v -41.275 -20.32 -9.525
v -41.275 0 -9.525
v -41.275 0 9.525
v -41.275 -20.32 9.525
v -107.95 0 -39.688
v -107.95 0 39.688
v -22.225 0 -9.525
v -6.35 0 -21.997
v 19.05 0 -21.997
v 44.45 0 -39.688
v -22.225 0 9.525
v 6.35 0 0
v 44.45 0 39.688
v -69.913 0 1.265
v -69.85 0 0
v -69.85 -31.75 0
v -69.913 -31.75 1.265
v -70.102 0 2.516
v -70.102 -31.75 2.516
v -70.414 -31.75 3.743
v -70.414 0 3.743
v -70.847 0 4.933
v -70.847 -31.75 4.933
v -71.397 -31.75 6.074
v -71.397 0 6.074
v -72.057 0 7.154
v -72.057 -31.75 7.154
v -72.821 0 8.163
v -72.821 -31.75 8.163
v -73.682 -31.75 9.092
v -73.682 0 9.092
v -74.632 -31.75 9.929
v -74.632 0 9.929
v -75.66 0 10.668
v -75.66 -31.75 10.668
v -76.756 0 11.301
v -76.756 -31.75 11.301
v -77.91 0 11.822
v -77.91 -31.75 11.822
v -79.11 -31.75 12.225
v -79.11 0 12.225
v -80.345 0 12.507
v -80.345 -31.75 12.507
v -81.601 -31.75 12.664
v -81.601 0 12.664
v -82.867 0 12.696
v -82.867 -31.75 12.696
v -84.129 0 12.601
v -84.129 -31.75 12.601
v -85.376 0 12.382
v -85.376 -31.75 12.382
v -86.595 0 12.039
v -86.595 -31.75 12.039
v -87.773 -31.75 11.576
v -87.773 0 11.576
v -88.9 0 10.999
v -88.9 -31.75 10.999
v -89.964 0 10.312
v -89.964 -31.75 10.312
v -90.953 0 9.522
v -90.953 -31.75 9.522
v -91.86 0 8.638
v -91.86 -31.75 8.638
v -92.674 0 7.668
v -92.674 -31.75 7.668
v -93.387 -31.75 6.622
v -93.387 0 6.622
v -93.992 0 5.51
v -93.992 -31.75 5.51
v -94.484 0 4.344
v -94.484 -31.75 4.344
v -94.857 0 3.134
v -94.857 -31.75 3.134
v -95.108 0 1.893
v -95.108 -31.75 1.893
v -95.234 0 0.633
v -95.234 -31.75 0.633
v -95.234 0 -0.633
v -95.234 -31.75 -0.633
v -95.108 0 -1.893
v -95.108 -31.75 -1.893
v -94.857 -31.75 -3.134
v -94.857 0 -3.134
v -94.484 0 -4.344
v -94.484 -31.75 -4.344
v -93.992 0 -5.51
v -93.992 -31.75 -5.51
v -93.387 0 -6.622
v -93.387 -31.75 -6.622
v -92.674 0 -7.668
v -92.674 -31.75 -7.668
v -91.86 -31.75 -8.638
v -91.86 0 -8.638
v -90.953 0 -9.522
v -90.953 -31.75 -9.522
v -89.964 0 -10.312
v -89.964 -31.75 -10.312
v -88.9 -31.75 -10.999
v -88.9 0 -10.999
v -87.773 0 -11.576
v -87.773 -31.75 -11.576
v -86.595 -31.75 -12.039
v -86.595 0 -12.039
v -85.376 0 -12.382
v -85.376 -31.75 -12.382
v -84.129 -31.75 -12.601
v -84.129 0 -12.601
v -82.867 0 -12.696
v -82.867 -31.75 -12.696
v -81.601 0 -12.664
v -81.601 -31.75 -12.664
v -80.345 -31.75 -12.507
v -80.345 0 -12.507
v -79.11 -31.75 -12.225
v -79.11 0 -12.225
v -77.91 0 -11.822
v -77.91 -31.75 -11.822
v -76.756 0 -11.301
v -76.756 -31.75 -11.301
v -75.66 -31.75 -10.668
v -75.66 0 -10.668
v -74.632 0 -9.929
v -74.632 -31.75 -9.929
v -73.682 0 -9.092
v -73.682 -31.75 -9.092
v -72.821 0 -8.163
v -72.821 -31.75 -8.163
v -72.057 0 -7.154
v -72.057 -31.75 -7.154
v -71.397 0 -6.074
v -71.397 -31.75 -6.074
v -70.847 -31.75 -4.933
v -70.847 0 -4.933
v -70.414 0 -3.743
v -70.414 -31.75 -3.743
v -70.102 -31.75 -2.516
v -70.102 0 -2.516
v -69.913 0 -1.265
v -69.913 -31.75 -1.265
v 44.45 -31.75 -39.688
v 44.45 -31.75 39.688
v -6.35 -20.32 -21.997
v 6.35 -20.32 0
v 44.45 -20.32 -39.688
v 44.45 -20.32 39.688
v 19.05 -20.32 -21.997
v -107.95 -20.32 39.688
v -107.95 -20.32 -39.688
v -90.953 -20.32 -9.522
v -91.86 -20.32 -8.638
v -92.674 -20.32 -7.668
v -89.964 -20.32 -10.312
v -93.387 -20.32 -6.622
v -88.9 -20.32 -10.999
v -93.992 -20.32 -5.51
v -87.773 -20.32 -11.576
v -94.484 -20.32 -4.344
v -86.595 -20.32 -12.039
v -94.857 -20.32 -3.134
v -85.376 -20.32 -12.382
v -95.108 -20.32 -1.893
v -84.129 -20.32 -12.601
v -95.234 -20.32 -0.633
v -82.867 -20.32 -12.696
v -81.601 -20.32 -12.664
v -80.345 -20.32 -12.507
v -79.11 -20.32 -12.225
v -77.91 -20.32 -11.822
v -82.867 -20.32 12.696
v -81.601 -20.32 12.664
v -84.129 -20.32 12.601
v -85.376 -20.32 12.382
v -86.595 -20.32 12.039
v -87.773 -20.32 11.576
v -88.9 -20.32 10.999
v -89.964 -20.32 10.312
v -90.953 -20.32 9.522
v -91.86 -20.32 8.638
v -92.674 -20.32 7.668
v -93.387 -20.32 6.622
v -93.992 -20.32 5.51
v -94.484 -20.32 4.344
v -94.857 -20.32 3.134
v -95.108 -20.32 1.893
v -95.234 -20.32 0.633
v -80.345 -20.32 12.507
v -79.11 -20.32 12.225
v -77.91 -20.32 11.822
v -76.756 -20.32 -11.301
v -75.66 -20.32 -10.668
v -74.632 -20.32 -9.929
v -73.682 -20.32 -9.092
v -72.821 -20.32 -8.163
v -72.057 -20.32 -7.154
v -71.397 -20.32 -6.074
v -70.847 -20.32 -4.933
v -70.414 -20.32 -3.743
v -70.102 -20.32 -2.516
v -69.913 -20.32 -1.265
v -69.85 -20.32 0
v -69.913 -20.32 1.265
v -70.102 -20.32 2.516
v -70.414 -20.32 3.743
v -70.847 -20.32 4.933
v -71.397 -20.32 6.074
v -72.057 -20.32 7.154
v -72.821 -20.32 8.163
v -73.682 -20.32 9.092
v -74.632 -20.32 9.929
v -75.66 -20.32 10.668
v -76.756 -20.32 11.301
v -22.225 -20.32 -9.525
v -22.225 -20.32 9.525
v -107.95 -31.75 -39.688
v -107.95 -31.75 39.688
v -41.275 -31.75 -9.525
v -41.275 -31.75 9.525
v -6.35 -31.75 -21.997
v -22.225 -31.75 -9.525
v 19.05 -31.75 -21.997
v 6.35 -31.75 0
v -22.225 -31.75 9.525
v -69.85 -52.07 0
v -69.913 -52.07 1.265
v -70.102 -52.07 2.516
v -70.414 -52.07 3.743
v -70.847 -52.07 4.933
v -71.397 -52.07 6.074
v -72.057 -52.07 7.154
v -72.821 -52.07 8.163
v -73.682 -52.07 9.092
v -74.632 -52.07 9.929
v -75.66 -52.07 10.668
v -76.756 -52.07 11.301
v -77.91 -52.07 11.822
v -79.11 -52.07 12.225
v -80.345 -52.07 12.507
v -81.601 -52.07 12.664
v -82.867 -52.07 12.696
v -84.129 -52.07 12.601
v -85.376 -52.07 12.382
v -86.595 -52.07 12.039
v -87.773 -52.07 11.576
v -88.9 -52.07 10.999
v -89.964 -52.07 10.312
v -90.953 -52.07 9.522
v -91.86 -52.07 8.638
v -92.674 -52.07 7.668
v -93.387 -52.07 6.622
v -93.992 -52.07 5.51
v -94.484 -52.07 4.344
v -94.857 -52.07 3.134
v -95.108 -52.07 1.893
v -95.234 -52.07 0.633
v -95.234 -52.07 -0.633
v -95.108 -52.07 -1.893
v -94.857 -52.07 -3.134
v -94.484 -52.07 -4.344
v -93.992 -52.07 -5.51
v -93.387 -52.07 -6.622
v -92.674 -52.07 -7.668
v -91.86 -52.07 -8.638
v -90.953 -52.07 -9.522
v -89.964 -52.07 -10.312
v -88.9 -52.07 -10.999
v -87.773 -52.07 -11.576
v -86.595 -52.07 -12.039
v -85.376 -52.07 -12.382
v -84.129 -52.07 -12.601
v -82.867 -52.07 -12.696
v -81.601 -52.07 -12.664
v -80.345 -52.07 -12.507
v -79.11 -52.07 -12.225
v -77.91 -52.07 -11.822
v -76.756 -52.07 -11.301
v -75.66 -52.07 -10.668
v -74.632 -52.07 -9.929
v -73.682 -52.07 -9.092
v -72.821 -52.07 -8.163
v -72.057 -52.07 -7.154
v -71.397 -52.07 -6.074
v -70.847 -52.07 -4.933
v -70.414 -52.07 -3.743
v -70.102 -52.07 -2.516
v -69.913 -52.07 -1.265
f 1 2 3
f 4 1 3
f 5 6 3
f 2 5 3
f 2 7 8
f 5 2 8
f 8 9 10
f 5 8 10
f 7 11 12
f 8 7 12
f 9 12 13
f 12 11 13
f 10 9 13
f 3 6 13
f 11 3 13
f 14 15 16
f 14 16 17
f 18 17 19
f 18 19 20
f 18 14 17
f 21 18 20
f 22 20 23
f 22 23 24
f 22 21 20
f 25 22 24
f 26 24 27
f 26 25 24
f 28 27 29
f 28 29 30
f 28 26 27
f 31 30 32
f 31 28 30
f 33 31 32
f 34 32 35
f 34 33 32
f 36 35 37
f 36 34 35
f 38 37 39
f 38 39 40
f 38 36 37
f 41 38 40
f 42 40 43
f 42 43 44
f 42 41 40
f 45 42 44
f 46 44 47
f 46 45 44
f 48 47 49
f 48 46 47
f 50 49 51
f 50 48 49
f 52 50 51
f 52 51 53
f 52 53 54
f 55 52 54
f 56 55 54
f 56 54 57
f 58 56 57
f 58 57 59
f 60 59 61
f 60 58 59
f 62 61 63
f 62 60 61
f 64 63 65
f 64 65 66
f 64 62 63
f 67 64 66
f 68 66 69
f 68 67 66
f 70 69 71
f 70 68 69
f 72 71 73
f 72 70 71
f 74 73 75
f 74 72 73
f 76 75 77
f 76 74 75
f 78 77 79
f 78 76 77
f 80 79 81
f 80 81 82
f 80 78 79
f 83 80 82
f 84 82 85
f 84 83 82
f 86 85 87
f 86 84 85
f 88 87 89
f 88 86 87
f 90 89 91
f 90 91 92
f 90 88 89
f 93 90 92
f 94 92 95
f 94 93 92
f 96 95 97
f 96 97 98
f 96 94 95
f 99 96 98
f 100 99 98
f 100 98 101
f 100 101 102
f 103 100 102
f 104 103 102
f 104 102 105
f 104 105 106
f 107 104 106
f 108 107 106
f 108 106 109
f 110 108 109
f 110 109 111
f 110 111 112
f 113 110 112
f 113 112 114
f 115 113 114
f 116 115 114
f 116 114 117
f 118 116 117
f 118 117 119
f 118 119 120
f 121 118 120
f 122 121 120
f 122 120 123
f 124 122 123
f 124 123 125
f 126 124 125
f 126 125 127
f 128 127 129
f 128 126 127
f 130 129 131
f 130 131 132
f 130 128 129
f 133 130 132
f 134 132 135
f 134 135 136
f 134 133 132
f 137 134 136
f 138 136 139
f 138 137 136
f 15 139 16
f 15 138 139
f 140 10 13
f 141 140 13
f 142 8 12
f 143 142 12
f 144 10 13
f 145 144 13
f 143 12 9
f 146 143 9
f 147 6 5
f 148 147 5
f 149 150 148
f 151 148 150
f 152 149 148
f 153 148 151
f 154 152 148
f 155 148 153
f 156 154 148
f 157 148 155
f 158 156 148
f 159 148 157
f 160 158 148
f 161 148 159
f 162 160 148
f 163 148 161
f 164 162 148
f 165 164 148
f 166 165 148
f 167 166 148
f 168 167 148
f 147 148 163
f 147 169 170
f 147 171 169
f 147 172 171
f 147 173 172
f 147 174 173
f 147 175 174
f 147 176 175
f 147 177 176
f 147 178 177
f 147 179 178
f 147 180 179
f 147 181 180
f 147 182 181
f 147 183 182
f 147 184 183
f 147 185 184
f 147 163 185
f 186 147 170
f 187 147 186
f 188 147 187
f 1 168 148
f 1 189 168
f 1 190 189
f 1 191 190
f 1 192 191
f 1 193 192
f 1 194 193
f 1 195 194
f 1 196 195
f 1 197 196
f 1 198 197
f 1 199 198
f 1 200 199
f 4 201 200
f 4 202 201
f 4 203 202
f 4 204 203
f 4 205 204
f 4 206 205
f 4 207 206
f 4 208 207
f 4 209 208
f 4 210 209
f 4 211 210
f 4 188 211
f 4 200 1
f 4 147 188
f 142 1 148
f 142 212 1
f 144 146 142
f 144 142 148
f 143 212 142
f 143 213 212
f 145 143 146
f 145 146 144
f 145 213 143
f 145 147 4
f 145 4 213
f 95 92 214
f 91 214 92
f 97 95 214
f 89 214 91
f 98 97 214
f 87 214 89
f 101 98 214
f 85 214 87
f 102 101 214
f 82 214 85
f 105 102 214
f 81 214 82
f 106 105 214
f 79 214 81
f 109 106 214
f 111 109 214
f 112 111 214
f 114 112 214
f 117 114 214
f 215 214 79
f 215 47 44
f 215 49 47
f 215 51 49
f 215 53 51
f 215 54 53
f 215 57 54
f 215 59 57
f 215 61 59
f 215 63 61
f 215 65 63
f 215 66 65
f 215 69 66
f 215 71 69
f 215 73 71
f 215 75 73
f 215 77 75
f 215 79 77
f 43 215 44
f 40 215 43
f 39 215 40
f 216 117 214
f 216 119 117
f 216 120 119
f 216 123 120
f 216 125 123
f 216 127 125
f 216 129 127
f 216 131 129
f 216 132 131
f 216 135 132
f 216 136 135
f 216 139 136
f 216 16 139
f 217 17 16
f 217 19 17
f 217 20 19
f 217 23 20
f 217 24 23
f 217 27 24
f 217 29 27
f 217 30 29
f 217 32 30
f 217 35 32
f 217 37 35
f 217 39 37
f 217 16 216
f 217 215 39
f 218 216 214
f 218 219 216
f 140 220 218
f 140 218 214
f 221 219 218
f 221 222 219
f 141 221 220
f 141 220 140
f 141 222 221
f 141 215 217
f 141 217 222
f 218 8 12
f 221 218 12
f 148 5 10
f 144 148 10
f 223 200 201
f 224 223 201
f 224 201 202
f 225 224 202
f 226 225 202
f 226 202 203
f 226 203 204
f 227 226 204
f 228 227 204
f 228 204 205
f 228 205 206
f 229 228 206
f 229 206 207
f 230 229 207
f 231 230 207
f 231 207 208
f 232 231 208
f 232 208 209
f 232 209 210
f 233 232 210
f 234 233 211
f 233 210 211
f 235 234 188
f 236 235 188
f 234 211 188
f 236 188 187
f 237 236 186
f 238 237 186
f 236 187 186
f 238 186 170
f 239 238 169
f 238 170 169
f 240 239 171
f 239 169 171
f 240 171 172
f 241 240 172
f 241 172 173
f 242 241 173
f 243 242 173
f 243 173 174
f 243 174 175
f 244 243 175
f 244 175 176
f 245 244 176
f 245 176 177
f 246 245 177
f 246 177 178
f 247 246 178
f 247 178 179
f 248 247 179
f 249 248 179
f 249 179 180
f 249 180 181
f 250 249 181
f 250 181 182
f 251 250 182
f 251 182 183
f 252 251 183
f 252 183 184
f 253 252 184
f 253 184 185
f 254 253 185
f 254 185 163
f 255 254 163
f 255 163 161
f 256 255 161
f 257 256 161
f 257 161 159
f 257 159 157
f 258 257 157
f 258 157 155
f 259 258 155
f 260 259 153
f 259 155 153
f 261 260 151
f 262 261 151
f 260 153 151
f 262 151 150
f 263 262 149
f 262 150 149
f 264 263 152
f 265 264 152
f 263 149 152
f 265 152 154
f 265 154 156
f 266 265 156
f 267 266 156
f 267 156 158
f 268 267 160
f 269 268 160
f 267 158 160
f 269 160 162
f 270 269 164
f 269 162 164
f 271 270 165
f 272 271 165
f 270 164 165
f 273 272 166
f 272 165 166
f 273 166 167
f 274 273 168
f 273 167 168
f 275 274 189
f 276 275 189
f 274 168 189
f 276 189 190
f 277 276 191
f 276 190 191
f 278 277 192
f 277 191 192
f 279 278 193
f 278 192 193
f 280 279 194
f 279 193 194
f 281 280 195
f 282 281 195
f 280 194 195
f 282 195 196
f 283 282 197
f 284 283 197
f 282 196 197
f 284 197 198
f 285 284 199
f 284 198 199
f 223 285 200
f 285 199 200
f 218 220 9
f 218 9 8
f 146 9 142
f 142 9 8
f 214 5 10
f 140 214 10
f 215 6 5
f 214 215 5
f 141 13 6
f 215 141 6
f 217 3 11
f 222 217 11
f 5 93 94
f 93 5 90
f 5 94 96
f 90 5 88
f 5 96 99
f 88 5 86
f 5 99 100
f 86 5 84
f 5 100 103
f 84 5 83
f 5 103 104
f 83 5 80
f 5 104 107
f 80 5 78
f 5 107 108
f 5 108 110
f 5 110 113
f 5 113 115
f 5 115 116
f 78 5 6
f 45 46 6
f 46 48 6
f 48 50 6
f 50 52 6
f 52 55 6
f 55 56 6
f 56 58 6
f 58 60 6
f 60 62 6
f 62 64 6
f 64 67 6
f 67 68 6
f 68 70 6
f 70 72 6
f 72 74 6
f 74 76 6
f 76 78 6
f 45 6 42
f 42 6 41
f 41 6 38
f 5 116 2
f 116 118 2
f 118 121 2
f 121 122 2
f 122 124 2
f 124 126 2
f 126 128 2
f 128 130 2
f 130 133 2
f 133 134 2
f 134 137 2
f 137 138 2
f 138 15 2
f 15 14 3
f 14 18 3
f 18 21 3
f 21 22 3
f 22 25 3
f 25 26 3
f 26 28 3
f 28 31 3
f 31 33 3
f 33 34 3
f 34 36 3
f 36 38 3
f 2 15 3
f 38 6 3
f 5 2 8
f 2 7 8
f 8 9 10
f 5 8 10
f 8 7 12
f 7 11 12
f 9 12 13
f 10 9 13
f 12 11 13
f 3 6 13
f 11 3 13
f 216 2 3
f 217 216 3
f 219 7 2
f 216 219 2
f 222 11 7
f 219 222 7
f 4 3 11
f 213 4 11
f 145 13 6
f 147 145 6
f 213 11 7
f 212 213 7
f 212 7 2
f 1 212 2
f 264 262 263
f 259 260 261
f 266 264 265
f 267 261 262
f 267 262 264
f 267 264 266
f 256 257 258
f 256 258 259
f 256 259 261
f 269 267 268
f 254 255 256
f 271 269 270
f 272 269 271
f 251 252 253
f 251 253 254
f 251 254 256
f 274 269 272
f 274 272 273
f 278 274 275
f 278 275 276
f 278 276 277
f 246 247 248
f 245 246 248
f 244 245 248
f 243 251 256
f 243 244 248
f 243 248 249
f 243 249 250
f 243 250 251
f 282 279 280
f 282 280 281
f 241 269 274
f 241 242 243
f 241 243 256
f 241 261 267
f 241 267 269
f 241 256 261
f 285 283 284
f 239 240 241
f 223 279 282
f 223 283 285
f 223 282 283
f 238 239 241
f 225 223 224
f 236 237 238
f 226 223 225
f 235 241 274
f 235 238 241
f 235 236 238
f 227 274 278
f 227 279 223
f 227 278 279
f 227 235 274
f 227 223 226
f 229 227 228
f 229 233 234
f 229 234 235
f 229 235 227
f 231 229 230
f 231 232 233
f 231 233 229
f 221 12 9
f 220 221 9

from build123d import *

# Parameters (mm, degrees)
F0_R     = 12.7
F1_DEPTH = 52.07
F2_DEPTH = 20.32
F3_DEPTH = 31.75


with BuildPart() as f1:
    # F0 (on Front) → F1 (new body)
    with BuildSketch(Plane.XZ):
        with Locations((-82.55, 0)):
            Circle(F0_R)
    extrude(amount=F1_DEPTH)

    # F0 (on Front) → F2 (join)
    with BuildSketch(Plane.XZ):
        Polygon((44.45, -39.6875), (44.45, 0), (44.45, 39.6875), (-107.95, 39.6875), (-107.95, -39.6875), align=None)
        Polygon((-6.35, -21.9970452561), (6.35, 0), (19.05, -21.9970452561), align=None, mode=Mode.SUBTRACT)
        with Locations((-82.55, 0)):
            Circle(F0_R, mode=Mode.SUBTRACT)
        Polygon((-22.225, 9.525), (-22.225, 0), (-22.225, -9.525), (-41.275, -9.525), (-41.275, 0), (-41.275, 9.525), align=None, mode=Mode.SUBTRACT)
    extrude(amount=F2_DEPTH)


with BuildPart() as f3:
    # F0 (on Front) → F3 (new body)
    with BuildSketch(Plane.XZ):
        Polygon((44.45, -39.6875), (44.45, 0), (44.45, 39.6875), (-107.95, 39.6875), (-107.95, -39.6875), align=None)
        Polygon((-6.35, -21.9970452561), (6.35, 0), (19.05, -21.9970452561), align=None, mode=Mode.SUBTRACT)
        with Locations((-82.55, 0)):
            Circle(F0_R, mode=Mode.SUBTRACT)
        Polygon((-22.225, 9.525), (-22.225, 0), (-22.225, -9.525), (-41.275, -9.525), (-41.275, 0), (-41.275, 9.525), align=None, mode=Mode.SUBTRACT)
    extrude(amount=F3_DEPTH)


solid = Compound([f1.part, f3.part])
